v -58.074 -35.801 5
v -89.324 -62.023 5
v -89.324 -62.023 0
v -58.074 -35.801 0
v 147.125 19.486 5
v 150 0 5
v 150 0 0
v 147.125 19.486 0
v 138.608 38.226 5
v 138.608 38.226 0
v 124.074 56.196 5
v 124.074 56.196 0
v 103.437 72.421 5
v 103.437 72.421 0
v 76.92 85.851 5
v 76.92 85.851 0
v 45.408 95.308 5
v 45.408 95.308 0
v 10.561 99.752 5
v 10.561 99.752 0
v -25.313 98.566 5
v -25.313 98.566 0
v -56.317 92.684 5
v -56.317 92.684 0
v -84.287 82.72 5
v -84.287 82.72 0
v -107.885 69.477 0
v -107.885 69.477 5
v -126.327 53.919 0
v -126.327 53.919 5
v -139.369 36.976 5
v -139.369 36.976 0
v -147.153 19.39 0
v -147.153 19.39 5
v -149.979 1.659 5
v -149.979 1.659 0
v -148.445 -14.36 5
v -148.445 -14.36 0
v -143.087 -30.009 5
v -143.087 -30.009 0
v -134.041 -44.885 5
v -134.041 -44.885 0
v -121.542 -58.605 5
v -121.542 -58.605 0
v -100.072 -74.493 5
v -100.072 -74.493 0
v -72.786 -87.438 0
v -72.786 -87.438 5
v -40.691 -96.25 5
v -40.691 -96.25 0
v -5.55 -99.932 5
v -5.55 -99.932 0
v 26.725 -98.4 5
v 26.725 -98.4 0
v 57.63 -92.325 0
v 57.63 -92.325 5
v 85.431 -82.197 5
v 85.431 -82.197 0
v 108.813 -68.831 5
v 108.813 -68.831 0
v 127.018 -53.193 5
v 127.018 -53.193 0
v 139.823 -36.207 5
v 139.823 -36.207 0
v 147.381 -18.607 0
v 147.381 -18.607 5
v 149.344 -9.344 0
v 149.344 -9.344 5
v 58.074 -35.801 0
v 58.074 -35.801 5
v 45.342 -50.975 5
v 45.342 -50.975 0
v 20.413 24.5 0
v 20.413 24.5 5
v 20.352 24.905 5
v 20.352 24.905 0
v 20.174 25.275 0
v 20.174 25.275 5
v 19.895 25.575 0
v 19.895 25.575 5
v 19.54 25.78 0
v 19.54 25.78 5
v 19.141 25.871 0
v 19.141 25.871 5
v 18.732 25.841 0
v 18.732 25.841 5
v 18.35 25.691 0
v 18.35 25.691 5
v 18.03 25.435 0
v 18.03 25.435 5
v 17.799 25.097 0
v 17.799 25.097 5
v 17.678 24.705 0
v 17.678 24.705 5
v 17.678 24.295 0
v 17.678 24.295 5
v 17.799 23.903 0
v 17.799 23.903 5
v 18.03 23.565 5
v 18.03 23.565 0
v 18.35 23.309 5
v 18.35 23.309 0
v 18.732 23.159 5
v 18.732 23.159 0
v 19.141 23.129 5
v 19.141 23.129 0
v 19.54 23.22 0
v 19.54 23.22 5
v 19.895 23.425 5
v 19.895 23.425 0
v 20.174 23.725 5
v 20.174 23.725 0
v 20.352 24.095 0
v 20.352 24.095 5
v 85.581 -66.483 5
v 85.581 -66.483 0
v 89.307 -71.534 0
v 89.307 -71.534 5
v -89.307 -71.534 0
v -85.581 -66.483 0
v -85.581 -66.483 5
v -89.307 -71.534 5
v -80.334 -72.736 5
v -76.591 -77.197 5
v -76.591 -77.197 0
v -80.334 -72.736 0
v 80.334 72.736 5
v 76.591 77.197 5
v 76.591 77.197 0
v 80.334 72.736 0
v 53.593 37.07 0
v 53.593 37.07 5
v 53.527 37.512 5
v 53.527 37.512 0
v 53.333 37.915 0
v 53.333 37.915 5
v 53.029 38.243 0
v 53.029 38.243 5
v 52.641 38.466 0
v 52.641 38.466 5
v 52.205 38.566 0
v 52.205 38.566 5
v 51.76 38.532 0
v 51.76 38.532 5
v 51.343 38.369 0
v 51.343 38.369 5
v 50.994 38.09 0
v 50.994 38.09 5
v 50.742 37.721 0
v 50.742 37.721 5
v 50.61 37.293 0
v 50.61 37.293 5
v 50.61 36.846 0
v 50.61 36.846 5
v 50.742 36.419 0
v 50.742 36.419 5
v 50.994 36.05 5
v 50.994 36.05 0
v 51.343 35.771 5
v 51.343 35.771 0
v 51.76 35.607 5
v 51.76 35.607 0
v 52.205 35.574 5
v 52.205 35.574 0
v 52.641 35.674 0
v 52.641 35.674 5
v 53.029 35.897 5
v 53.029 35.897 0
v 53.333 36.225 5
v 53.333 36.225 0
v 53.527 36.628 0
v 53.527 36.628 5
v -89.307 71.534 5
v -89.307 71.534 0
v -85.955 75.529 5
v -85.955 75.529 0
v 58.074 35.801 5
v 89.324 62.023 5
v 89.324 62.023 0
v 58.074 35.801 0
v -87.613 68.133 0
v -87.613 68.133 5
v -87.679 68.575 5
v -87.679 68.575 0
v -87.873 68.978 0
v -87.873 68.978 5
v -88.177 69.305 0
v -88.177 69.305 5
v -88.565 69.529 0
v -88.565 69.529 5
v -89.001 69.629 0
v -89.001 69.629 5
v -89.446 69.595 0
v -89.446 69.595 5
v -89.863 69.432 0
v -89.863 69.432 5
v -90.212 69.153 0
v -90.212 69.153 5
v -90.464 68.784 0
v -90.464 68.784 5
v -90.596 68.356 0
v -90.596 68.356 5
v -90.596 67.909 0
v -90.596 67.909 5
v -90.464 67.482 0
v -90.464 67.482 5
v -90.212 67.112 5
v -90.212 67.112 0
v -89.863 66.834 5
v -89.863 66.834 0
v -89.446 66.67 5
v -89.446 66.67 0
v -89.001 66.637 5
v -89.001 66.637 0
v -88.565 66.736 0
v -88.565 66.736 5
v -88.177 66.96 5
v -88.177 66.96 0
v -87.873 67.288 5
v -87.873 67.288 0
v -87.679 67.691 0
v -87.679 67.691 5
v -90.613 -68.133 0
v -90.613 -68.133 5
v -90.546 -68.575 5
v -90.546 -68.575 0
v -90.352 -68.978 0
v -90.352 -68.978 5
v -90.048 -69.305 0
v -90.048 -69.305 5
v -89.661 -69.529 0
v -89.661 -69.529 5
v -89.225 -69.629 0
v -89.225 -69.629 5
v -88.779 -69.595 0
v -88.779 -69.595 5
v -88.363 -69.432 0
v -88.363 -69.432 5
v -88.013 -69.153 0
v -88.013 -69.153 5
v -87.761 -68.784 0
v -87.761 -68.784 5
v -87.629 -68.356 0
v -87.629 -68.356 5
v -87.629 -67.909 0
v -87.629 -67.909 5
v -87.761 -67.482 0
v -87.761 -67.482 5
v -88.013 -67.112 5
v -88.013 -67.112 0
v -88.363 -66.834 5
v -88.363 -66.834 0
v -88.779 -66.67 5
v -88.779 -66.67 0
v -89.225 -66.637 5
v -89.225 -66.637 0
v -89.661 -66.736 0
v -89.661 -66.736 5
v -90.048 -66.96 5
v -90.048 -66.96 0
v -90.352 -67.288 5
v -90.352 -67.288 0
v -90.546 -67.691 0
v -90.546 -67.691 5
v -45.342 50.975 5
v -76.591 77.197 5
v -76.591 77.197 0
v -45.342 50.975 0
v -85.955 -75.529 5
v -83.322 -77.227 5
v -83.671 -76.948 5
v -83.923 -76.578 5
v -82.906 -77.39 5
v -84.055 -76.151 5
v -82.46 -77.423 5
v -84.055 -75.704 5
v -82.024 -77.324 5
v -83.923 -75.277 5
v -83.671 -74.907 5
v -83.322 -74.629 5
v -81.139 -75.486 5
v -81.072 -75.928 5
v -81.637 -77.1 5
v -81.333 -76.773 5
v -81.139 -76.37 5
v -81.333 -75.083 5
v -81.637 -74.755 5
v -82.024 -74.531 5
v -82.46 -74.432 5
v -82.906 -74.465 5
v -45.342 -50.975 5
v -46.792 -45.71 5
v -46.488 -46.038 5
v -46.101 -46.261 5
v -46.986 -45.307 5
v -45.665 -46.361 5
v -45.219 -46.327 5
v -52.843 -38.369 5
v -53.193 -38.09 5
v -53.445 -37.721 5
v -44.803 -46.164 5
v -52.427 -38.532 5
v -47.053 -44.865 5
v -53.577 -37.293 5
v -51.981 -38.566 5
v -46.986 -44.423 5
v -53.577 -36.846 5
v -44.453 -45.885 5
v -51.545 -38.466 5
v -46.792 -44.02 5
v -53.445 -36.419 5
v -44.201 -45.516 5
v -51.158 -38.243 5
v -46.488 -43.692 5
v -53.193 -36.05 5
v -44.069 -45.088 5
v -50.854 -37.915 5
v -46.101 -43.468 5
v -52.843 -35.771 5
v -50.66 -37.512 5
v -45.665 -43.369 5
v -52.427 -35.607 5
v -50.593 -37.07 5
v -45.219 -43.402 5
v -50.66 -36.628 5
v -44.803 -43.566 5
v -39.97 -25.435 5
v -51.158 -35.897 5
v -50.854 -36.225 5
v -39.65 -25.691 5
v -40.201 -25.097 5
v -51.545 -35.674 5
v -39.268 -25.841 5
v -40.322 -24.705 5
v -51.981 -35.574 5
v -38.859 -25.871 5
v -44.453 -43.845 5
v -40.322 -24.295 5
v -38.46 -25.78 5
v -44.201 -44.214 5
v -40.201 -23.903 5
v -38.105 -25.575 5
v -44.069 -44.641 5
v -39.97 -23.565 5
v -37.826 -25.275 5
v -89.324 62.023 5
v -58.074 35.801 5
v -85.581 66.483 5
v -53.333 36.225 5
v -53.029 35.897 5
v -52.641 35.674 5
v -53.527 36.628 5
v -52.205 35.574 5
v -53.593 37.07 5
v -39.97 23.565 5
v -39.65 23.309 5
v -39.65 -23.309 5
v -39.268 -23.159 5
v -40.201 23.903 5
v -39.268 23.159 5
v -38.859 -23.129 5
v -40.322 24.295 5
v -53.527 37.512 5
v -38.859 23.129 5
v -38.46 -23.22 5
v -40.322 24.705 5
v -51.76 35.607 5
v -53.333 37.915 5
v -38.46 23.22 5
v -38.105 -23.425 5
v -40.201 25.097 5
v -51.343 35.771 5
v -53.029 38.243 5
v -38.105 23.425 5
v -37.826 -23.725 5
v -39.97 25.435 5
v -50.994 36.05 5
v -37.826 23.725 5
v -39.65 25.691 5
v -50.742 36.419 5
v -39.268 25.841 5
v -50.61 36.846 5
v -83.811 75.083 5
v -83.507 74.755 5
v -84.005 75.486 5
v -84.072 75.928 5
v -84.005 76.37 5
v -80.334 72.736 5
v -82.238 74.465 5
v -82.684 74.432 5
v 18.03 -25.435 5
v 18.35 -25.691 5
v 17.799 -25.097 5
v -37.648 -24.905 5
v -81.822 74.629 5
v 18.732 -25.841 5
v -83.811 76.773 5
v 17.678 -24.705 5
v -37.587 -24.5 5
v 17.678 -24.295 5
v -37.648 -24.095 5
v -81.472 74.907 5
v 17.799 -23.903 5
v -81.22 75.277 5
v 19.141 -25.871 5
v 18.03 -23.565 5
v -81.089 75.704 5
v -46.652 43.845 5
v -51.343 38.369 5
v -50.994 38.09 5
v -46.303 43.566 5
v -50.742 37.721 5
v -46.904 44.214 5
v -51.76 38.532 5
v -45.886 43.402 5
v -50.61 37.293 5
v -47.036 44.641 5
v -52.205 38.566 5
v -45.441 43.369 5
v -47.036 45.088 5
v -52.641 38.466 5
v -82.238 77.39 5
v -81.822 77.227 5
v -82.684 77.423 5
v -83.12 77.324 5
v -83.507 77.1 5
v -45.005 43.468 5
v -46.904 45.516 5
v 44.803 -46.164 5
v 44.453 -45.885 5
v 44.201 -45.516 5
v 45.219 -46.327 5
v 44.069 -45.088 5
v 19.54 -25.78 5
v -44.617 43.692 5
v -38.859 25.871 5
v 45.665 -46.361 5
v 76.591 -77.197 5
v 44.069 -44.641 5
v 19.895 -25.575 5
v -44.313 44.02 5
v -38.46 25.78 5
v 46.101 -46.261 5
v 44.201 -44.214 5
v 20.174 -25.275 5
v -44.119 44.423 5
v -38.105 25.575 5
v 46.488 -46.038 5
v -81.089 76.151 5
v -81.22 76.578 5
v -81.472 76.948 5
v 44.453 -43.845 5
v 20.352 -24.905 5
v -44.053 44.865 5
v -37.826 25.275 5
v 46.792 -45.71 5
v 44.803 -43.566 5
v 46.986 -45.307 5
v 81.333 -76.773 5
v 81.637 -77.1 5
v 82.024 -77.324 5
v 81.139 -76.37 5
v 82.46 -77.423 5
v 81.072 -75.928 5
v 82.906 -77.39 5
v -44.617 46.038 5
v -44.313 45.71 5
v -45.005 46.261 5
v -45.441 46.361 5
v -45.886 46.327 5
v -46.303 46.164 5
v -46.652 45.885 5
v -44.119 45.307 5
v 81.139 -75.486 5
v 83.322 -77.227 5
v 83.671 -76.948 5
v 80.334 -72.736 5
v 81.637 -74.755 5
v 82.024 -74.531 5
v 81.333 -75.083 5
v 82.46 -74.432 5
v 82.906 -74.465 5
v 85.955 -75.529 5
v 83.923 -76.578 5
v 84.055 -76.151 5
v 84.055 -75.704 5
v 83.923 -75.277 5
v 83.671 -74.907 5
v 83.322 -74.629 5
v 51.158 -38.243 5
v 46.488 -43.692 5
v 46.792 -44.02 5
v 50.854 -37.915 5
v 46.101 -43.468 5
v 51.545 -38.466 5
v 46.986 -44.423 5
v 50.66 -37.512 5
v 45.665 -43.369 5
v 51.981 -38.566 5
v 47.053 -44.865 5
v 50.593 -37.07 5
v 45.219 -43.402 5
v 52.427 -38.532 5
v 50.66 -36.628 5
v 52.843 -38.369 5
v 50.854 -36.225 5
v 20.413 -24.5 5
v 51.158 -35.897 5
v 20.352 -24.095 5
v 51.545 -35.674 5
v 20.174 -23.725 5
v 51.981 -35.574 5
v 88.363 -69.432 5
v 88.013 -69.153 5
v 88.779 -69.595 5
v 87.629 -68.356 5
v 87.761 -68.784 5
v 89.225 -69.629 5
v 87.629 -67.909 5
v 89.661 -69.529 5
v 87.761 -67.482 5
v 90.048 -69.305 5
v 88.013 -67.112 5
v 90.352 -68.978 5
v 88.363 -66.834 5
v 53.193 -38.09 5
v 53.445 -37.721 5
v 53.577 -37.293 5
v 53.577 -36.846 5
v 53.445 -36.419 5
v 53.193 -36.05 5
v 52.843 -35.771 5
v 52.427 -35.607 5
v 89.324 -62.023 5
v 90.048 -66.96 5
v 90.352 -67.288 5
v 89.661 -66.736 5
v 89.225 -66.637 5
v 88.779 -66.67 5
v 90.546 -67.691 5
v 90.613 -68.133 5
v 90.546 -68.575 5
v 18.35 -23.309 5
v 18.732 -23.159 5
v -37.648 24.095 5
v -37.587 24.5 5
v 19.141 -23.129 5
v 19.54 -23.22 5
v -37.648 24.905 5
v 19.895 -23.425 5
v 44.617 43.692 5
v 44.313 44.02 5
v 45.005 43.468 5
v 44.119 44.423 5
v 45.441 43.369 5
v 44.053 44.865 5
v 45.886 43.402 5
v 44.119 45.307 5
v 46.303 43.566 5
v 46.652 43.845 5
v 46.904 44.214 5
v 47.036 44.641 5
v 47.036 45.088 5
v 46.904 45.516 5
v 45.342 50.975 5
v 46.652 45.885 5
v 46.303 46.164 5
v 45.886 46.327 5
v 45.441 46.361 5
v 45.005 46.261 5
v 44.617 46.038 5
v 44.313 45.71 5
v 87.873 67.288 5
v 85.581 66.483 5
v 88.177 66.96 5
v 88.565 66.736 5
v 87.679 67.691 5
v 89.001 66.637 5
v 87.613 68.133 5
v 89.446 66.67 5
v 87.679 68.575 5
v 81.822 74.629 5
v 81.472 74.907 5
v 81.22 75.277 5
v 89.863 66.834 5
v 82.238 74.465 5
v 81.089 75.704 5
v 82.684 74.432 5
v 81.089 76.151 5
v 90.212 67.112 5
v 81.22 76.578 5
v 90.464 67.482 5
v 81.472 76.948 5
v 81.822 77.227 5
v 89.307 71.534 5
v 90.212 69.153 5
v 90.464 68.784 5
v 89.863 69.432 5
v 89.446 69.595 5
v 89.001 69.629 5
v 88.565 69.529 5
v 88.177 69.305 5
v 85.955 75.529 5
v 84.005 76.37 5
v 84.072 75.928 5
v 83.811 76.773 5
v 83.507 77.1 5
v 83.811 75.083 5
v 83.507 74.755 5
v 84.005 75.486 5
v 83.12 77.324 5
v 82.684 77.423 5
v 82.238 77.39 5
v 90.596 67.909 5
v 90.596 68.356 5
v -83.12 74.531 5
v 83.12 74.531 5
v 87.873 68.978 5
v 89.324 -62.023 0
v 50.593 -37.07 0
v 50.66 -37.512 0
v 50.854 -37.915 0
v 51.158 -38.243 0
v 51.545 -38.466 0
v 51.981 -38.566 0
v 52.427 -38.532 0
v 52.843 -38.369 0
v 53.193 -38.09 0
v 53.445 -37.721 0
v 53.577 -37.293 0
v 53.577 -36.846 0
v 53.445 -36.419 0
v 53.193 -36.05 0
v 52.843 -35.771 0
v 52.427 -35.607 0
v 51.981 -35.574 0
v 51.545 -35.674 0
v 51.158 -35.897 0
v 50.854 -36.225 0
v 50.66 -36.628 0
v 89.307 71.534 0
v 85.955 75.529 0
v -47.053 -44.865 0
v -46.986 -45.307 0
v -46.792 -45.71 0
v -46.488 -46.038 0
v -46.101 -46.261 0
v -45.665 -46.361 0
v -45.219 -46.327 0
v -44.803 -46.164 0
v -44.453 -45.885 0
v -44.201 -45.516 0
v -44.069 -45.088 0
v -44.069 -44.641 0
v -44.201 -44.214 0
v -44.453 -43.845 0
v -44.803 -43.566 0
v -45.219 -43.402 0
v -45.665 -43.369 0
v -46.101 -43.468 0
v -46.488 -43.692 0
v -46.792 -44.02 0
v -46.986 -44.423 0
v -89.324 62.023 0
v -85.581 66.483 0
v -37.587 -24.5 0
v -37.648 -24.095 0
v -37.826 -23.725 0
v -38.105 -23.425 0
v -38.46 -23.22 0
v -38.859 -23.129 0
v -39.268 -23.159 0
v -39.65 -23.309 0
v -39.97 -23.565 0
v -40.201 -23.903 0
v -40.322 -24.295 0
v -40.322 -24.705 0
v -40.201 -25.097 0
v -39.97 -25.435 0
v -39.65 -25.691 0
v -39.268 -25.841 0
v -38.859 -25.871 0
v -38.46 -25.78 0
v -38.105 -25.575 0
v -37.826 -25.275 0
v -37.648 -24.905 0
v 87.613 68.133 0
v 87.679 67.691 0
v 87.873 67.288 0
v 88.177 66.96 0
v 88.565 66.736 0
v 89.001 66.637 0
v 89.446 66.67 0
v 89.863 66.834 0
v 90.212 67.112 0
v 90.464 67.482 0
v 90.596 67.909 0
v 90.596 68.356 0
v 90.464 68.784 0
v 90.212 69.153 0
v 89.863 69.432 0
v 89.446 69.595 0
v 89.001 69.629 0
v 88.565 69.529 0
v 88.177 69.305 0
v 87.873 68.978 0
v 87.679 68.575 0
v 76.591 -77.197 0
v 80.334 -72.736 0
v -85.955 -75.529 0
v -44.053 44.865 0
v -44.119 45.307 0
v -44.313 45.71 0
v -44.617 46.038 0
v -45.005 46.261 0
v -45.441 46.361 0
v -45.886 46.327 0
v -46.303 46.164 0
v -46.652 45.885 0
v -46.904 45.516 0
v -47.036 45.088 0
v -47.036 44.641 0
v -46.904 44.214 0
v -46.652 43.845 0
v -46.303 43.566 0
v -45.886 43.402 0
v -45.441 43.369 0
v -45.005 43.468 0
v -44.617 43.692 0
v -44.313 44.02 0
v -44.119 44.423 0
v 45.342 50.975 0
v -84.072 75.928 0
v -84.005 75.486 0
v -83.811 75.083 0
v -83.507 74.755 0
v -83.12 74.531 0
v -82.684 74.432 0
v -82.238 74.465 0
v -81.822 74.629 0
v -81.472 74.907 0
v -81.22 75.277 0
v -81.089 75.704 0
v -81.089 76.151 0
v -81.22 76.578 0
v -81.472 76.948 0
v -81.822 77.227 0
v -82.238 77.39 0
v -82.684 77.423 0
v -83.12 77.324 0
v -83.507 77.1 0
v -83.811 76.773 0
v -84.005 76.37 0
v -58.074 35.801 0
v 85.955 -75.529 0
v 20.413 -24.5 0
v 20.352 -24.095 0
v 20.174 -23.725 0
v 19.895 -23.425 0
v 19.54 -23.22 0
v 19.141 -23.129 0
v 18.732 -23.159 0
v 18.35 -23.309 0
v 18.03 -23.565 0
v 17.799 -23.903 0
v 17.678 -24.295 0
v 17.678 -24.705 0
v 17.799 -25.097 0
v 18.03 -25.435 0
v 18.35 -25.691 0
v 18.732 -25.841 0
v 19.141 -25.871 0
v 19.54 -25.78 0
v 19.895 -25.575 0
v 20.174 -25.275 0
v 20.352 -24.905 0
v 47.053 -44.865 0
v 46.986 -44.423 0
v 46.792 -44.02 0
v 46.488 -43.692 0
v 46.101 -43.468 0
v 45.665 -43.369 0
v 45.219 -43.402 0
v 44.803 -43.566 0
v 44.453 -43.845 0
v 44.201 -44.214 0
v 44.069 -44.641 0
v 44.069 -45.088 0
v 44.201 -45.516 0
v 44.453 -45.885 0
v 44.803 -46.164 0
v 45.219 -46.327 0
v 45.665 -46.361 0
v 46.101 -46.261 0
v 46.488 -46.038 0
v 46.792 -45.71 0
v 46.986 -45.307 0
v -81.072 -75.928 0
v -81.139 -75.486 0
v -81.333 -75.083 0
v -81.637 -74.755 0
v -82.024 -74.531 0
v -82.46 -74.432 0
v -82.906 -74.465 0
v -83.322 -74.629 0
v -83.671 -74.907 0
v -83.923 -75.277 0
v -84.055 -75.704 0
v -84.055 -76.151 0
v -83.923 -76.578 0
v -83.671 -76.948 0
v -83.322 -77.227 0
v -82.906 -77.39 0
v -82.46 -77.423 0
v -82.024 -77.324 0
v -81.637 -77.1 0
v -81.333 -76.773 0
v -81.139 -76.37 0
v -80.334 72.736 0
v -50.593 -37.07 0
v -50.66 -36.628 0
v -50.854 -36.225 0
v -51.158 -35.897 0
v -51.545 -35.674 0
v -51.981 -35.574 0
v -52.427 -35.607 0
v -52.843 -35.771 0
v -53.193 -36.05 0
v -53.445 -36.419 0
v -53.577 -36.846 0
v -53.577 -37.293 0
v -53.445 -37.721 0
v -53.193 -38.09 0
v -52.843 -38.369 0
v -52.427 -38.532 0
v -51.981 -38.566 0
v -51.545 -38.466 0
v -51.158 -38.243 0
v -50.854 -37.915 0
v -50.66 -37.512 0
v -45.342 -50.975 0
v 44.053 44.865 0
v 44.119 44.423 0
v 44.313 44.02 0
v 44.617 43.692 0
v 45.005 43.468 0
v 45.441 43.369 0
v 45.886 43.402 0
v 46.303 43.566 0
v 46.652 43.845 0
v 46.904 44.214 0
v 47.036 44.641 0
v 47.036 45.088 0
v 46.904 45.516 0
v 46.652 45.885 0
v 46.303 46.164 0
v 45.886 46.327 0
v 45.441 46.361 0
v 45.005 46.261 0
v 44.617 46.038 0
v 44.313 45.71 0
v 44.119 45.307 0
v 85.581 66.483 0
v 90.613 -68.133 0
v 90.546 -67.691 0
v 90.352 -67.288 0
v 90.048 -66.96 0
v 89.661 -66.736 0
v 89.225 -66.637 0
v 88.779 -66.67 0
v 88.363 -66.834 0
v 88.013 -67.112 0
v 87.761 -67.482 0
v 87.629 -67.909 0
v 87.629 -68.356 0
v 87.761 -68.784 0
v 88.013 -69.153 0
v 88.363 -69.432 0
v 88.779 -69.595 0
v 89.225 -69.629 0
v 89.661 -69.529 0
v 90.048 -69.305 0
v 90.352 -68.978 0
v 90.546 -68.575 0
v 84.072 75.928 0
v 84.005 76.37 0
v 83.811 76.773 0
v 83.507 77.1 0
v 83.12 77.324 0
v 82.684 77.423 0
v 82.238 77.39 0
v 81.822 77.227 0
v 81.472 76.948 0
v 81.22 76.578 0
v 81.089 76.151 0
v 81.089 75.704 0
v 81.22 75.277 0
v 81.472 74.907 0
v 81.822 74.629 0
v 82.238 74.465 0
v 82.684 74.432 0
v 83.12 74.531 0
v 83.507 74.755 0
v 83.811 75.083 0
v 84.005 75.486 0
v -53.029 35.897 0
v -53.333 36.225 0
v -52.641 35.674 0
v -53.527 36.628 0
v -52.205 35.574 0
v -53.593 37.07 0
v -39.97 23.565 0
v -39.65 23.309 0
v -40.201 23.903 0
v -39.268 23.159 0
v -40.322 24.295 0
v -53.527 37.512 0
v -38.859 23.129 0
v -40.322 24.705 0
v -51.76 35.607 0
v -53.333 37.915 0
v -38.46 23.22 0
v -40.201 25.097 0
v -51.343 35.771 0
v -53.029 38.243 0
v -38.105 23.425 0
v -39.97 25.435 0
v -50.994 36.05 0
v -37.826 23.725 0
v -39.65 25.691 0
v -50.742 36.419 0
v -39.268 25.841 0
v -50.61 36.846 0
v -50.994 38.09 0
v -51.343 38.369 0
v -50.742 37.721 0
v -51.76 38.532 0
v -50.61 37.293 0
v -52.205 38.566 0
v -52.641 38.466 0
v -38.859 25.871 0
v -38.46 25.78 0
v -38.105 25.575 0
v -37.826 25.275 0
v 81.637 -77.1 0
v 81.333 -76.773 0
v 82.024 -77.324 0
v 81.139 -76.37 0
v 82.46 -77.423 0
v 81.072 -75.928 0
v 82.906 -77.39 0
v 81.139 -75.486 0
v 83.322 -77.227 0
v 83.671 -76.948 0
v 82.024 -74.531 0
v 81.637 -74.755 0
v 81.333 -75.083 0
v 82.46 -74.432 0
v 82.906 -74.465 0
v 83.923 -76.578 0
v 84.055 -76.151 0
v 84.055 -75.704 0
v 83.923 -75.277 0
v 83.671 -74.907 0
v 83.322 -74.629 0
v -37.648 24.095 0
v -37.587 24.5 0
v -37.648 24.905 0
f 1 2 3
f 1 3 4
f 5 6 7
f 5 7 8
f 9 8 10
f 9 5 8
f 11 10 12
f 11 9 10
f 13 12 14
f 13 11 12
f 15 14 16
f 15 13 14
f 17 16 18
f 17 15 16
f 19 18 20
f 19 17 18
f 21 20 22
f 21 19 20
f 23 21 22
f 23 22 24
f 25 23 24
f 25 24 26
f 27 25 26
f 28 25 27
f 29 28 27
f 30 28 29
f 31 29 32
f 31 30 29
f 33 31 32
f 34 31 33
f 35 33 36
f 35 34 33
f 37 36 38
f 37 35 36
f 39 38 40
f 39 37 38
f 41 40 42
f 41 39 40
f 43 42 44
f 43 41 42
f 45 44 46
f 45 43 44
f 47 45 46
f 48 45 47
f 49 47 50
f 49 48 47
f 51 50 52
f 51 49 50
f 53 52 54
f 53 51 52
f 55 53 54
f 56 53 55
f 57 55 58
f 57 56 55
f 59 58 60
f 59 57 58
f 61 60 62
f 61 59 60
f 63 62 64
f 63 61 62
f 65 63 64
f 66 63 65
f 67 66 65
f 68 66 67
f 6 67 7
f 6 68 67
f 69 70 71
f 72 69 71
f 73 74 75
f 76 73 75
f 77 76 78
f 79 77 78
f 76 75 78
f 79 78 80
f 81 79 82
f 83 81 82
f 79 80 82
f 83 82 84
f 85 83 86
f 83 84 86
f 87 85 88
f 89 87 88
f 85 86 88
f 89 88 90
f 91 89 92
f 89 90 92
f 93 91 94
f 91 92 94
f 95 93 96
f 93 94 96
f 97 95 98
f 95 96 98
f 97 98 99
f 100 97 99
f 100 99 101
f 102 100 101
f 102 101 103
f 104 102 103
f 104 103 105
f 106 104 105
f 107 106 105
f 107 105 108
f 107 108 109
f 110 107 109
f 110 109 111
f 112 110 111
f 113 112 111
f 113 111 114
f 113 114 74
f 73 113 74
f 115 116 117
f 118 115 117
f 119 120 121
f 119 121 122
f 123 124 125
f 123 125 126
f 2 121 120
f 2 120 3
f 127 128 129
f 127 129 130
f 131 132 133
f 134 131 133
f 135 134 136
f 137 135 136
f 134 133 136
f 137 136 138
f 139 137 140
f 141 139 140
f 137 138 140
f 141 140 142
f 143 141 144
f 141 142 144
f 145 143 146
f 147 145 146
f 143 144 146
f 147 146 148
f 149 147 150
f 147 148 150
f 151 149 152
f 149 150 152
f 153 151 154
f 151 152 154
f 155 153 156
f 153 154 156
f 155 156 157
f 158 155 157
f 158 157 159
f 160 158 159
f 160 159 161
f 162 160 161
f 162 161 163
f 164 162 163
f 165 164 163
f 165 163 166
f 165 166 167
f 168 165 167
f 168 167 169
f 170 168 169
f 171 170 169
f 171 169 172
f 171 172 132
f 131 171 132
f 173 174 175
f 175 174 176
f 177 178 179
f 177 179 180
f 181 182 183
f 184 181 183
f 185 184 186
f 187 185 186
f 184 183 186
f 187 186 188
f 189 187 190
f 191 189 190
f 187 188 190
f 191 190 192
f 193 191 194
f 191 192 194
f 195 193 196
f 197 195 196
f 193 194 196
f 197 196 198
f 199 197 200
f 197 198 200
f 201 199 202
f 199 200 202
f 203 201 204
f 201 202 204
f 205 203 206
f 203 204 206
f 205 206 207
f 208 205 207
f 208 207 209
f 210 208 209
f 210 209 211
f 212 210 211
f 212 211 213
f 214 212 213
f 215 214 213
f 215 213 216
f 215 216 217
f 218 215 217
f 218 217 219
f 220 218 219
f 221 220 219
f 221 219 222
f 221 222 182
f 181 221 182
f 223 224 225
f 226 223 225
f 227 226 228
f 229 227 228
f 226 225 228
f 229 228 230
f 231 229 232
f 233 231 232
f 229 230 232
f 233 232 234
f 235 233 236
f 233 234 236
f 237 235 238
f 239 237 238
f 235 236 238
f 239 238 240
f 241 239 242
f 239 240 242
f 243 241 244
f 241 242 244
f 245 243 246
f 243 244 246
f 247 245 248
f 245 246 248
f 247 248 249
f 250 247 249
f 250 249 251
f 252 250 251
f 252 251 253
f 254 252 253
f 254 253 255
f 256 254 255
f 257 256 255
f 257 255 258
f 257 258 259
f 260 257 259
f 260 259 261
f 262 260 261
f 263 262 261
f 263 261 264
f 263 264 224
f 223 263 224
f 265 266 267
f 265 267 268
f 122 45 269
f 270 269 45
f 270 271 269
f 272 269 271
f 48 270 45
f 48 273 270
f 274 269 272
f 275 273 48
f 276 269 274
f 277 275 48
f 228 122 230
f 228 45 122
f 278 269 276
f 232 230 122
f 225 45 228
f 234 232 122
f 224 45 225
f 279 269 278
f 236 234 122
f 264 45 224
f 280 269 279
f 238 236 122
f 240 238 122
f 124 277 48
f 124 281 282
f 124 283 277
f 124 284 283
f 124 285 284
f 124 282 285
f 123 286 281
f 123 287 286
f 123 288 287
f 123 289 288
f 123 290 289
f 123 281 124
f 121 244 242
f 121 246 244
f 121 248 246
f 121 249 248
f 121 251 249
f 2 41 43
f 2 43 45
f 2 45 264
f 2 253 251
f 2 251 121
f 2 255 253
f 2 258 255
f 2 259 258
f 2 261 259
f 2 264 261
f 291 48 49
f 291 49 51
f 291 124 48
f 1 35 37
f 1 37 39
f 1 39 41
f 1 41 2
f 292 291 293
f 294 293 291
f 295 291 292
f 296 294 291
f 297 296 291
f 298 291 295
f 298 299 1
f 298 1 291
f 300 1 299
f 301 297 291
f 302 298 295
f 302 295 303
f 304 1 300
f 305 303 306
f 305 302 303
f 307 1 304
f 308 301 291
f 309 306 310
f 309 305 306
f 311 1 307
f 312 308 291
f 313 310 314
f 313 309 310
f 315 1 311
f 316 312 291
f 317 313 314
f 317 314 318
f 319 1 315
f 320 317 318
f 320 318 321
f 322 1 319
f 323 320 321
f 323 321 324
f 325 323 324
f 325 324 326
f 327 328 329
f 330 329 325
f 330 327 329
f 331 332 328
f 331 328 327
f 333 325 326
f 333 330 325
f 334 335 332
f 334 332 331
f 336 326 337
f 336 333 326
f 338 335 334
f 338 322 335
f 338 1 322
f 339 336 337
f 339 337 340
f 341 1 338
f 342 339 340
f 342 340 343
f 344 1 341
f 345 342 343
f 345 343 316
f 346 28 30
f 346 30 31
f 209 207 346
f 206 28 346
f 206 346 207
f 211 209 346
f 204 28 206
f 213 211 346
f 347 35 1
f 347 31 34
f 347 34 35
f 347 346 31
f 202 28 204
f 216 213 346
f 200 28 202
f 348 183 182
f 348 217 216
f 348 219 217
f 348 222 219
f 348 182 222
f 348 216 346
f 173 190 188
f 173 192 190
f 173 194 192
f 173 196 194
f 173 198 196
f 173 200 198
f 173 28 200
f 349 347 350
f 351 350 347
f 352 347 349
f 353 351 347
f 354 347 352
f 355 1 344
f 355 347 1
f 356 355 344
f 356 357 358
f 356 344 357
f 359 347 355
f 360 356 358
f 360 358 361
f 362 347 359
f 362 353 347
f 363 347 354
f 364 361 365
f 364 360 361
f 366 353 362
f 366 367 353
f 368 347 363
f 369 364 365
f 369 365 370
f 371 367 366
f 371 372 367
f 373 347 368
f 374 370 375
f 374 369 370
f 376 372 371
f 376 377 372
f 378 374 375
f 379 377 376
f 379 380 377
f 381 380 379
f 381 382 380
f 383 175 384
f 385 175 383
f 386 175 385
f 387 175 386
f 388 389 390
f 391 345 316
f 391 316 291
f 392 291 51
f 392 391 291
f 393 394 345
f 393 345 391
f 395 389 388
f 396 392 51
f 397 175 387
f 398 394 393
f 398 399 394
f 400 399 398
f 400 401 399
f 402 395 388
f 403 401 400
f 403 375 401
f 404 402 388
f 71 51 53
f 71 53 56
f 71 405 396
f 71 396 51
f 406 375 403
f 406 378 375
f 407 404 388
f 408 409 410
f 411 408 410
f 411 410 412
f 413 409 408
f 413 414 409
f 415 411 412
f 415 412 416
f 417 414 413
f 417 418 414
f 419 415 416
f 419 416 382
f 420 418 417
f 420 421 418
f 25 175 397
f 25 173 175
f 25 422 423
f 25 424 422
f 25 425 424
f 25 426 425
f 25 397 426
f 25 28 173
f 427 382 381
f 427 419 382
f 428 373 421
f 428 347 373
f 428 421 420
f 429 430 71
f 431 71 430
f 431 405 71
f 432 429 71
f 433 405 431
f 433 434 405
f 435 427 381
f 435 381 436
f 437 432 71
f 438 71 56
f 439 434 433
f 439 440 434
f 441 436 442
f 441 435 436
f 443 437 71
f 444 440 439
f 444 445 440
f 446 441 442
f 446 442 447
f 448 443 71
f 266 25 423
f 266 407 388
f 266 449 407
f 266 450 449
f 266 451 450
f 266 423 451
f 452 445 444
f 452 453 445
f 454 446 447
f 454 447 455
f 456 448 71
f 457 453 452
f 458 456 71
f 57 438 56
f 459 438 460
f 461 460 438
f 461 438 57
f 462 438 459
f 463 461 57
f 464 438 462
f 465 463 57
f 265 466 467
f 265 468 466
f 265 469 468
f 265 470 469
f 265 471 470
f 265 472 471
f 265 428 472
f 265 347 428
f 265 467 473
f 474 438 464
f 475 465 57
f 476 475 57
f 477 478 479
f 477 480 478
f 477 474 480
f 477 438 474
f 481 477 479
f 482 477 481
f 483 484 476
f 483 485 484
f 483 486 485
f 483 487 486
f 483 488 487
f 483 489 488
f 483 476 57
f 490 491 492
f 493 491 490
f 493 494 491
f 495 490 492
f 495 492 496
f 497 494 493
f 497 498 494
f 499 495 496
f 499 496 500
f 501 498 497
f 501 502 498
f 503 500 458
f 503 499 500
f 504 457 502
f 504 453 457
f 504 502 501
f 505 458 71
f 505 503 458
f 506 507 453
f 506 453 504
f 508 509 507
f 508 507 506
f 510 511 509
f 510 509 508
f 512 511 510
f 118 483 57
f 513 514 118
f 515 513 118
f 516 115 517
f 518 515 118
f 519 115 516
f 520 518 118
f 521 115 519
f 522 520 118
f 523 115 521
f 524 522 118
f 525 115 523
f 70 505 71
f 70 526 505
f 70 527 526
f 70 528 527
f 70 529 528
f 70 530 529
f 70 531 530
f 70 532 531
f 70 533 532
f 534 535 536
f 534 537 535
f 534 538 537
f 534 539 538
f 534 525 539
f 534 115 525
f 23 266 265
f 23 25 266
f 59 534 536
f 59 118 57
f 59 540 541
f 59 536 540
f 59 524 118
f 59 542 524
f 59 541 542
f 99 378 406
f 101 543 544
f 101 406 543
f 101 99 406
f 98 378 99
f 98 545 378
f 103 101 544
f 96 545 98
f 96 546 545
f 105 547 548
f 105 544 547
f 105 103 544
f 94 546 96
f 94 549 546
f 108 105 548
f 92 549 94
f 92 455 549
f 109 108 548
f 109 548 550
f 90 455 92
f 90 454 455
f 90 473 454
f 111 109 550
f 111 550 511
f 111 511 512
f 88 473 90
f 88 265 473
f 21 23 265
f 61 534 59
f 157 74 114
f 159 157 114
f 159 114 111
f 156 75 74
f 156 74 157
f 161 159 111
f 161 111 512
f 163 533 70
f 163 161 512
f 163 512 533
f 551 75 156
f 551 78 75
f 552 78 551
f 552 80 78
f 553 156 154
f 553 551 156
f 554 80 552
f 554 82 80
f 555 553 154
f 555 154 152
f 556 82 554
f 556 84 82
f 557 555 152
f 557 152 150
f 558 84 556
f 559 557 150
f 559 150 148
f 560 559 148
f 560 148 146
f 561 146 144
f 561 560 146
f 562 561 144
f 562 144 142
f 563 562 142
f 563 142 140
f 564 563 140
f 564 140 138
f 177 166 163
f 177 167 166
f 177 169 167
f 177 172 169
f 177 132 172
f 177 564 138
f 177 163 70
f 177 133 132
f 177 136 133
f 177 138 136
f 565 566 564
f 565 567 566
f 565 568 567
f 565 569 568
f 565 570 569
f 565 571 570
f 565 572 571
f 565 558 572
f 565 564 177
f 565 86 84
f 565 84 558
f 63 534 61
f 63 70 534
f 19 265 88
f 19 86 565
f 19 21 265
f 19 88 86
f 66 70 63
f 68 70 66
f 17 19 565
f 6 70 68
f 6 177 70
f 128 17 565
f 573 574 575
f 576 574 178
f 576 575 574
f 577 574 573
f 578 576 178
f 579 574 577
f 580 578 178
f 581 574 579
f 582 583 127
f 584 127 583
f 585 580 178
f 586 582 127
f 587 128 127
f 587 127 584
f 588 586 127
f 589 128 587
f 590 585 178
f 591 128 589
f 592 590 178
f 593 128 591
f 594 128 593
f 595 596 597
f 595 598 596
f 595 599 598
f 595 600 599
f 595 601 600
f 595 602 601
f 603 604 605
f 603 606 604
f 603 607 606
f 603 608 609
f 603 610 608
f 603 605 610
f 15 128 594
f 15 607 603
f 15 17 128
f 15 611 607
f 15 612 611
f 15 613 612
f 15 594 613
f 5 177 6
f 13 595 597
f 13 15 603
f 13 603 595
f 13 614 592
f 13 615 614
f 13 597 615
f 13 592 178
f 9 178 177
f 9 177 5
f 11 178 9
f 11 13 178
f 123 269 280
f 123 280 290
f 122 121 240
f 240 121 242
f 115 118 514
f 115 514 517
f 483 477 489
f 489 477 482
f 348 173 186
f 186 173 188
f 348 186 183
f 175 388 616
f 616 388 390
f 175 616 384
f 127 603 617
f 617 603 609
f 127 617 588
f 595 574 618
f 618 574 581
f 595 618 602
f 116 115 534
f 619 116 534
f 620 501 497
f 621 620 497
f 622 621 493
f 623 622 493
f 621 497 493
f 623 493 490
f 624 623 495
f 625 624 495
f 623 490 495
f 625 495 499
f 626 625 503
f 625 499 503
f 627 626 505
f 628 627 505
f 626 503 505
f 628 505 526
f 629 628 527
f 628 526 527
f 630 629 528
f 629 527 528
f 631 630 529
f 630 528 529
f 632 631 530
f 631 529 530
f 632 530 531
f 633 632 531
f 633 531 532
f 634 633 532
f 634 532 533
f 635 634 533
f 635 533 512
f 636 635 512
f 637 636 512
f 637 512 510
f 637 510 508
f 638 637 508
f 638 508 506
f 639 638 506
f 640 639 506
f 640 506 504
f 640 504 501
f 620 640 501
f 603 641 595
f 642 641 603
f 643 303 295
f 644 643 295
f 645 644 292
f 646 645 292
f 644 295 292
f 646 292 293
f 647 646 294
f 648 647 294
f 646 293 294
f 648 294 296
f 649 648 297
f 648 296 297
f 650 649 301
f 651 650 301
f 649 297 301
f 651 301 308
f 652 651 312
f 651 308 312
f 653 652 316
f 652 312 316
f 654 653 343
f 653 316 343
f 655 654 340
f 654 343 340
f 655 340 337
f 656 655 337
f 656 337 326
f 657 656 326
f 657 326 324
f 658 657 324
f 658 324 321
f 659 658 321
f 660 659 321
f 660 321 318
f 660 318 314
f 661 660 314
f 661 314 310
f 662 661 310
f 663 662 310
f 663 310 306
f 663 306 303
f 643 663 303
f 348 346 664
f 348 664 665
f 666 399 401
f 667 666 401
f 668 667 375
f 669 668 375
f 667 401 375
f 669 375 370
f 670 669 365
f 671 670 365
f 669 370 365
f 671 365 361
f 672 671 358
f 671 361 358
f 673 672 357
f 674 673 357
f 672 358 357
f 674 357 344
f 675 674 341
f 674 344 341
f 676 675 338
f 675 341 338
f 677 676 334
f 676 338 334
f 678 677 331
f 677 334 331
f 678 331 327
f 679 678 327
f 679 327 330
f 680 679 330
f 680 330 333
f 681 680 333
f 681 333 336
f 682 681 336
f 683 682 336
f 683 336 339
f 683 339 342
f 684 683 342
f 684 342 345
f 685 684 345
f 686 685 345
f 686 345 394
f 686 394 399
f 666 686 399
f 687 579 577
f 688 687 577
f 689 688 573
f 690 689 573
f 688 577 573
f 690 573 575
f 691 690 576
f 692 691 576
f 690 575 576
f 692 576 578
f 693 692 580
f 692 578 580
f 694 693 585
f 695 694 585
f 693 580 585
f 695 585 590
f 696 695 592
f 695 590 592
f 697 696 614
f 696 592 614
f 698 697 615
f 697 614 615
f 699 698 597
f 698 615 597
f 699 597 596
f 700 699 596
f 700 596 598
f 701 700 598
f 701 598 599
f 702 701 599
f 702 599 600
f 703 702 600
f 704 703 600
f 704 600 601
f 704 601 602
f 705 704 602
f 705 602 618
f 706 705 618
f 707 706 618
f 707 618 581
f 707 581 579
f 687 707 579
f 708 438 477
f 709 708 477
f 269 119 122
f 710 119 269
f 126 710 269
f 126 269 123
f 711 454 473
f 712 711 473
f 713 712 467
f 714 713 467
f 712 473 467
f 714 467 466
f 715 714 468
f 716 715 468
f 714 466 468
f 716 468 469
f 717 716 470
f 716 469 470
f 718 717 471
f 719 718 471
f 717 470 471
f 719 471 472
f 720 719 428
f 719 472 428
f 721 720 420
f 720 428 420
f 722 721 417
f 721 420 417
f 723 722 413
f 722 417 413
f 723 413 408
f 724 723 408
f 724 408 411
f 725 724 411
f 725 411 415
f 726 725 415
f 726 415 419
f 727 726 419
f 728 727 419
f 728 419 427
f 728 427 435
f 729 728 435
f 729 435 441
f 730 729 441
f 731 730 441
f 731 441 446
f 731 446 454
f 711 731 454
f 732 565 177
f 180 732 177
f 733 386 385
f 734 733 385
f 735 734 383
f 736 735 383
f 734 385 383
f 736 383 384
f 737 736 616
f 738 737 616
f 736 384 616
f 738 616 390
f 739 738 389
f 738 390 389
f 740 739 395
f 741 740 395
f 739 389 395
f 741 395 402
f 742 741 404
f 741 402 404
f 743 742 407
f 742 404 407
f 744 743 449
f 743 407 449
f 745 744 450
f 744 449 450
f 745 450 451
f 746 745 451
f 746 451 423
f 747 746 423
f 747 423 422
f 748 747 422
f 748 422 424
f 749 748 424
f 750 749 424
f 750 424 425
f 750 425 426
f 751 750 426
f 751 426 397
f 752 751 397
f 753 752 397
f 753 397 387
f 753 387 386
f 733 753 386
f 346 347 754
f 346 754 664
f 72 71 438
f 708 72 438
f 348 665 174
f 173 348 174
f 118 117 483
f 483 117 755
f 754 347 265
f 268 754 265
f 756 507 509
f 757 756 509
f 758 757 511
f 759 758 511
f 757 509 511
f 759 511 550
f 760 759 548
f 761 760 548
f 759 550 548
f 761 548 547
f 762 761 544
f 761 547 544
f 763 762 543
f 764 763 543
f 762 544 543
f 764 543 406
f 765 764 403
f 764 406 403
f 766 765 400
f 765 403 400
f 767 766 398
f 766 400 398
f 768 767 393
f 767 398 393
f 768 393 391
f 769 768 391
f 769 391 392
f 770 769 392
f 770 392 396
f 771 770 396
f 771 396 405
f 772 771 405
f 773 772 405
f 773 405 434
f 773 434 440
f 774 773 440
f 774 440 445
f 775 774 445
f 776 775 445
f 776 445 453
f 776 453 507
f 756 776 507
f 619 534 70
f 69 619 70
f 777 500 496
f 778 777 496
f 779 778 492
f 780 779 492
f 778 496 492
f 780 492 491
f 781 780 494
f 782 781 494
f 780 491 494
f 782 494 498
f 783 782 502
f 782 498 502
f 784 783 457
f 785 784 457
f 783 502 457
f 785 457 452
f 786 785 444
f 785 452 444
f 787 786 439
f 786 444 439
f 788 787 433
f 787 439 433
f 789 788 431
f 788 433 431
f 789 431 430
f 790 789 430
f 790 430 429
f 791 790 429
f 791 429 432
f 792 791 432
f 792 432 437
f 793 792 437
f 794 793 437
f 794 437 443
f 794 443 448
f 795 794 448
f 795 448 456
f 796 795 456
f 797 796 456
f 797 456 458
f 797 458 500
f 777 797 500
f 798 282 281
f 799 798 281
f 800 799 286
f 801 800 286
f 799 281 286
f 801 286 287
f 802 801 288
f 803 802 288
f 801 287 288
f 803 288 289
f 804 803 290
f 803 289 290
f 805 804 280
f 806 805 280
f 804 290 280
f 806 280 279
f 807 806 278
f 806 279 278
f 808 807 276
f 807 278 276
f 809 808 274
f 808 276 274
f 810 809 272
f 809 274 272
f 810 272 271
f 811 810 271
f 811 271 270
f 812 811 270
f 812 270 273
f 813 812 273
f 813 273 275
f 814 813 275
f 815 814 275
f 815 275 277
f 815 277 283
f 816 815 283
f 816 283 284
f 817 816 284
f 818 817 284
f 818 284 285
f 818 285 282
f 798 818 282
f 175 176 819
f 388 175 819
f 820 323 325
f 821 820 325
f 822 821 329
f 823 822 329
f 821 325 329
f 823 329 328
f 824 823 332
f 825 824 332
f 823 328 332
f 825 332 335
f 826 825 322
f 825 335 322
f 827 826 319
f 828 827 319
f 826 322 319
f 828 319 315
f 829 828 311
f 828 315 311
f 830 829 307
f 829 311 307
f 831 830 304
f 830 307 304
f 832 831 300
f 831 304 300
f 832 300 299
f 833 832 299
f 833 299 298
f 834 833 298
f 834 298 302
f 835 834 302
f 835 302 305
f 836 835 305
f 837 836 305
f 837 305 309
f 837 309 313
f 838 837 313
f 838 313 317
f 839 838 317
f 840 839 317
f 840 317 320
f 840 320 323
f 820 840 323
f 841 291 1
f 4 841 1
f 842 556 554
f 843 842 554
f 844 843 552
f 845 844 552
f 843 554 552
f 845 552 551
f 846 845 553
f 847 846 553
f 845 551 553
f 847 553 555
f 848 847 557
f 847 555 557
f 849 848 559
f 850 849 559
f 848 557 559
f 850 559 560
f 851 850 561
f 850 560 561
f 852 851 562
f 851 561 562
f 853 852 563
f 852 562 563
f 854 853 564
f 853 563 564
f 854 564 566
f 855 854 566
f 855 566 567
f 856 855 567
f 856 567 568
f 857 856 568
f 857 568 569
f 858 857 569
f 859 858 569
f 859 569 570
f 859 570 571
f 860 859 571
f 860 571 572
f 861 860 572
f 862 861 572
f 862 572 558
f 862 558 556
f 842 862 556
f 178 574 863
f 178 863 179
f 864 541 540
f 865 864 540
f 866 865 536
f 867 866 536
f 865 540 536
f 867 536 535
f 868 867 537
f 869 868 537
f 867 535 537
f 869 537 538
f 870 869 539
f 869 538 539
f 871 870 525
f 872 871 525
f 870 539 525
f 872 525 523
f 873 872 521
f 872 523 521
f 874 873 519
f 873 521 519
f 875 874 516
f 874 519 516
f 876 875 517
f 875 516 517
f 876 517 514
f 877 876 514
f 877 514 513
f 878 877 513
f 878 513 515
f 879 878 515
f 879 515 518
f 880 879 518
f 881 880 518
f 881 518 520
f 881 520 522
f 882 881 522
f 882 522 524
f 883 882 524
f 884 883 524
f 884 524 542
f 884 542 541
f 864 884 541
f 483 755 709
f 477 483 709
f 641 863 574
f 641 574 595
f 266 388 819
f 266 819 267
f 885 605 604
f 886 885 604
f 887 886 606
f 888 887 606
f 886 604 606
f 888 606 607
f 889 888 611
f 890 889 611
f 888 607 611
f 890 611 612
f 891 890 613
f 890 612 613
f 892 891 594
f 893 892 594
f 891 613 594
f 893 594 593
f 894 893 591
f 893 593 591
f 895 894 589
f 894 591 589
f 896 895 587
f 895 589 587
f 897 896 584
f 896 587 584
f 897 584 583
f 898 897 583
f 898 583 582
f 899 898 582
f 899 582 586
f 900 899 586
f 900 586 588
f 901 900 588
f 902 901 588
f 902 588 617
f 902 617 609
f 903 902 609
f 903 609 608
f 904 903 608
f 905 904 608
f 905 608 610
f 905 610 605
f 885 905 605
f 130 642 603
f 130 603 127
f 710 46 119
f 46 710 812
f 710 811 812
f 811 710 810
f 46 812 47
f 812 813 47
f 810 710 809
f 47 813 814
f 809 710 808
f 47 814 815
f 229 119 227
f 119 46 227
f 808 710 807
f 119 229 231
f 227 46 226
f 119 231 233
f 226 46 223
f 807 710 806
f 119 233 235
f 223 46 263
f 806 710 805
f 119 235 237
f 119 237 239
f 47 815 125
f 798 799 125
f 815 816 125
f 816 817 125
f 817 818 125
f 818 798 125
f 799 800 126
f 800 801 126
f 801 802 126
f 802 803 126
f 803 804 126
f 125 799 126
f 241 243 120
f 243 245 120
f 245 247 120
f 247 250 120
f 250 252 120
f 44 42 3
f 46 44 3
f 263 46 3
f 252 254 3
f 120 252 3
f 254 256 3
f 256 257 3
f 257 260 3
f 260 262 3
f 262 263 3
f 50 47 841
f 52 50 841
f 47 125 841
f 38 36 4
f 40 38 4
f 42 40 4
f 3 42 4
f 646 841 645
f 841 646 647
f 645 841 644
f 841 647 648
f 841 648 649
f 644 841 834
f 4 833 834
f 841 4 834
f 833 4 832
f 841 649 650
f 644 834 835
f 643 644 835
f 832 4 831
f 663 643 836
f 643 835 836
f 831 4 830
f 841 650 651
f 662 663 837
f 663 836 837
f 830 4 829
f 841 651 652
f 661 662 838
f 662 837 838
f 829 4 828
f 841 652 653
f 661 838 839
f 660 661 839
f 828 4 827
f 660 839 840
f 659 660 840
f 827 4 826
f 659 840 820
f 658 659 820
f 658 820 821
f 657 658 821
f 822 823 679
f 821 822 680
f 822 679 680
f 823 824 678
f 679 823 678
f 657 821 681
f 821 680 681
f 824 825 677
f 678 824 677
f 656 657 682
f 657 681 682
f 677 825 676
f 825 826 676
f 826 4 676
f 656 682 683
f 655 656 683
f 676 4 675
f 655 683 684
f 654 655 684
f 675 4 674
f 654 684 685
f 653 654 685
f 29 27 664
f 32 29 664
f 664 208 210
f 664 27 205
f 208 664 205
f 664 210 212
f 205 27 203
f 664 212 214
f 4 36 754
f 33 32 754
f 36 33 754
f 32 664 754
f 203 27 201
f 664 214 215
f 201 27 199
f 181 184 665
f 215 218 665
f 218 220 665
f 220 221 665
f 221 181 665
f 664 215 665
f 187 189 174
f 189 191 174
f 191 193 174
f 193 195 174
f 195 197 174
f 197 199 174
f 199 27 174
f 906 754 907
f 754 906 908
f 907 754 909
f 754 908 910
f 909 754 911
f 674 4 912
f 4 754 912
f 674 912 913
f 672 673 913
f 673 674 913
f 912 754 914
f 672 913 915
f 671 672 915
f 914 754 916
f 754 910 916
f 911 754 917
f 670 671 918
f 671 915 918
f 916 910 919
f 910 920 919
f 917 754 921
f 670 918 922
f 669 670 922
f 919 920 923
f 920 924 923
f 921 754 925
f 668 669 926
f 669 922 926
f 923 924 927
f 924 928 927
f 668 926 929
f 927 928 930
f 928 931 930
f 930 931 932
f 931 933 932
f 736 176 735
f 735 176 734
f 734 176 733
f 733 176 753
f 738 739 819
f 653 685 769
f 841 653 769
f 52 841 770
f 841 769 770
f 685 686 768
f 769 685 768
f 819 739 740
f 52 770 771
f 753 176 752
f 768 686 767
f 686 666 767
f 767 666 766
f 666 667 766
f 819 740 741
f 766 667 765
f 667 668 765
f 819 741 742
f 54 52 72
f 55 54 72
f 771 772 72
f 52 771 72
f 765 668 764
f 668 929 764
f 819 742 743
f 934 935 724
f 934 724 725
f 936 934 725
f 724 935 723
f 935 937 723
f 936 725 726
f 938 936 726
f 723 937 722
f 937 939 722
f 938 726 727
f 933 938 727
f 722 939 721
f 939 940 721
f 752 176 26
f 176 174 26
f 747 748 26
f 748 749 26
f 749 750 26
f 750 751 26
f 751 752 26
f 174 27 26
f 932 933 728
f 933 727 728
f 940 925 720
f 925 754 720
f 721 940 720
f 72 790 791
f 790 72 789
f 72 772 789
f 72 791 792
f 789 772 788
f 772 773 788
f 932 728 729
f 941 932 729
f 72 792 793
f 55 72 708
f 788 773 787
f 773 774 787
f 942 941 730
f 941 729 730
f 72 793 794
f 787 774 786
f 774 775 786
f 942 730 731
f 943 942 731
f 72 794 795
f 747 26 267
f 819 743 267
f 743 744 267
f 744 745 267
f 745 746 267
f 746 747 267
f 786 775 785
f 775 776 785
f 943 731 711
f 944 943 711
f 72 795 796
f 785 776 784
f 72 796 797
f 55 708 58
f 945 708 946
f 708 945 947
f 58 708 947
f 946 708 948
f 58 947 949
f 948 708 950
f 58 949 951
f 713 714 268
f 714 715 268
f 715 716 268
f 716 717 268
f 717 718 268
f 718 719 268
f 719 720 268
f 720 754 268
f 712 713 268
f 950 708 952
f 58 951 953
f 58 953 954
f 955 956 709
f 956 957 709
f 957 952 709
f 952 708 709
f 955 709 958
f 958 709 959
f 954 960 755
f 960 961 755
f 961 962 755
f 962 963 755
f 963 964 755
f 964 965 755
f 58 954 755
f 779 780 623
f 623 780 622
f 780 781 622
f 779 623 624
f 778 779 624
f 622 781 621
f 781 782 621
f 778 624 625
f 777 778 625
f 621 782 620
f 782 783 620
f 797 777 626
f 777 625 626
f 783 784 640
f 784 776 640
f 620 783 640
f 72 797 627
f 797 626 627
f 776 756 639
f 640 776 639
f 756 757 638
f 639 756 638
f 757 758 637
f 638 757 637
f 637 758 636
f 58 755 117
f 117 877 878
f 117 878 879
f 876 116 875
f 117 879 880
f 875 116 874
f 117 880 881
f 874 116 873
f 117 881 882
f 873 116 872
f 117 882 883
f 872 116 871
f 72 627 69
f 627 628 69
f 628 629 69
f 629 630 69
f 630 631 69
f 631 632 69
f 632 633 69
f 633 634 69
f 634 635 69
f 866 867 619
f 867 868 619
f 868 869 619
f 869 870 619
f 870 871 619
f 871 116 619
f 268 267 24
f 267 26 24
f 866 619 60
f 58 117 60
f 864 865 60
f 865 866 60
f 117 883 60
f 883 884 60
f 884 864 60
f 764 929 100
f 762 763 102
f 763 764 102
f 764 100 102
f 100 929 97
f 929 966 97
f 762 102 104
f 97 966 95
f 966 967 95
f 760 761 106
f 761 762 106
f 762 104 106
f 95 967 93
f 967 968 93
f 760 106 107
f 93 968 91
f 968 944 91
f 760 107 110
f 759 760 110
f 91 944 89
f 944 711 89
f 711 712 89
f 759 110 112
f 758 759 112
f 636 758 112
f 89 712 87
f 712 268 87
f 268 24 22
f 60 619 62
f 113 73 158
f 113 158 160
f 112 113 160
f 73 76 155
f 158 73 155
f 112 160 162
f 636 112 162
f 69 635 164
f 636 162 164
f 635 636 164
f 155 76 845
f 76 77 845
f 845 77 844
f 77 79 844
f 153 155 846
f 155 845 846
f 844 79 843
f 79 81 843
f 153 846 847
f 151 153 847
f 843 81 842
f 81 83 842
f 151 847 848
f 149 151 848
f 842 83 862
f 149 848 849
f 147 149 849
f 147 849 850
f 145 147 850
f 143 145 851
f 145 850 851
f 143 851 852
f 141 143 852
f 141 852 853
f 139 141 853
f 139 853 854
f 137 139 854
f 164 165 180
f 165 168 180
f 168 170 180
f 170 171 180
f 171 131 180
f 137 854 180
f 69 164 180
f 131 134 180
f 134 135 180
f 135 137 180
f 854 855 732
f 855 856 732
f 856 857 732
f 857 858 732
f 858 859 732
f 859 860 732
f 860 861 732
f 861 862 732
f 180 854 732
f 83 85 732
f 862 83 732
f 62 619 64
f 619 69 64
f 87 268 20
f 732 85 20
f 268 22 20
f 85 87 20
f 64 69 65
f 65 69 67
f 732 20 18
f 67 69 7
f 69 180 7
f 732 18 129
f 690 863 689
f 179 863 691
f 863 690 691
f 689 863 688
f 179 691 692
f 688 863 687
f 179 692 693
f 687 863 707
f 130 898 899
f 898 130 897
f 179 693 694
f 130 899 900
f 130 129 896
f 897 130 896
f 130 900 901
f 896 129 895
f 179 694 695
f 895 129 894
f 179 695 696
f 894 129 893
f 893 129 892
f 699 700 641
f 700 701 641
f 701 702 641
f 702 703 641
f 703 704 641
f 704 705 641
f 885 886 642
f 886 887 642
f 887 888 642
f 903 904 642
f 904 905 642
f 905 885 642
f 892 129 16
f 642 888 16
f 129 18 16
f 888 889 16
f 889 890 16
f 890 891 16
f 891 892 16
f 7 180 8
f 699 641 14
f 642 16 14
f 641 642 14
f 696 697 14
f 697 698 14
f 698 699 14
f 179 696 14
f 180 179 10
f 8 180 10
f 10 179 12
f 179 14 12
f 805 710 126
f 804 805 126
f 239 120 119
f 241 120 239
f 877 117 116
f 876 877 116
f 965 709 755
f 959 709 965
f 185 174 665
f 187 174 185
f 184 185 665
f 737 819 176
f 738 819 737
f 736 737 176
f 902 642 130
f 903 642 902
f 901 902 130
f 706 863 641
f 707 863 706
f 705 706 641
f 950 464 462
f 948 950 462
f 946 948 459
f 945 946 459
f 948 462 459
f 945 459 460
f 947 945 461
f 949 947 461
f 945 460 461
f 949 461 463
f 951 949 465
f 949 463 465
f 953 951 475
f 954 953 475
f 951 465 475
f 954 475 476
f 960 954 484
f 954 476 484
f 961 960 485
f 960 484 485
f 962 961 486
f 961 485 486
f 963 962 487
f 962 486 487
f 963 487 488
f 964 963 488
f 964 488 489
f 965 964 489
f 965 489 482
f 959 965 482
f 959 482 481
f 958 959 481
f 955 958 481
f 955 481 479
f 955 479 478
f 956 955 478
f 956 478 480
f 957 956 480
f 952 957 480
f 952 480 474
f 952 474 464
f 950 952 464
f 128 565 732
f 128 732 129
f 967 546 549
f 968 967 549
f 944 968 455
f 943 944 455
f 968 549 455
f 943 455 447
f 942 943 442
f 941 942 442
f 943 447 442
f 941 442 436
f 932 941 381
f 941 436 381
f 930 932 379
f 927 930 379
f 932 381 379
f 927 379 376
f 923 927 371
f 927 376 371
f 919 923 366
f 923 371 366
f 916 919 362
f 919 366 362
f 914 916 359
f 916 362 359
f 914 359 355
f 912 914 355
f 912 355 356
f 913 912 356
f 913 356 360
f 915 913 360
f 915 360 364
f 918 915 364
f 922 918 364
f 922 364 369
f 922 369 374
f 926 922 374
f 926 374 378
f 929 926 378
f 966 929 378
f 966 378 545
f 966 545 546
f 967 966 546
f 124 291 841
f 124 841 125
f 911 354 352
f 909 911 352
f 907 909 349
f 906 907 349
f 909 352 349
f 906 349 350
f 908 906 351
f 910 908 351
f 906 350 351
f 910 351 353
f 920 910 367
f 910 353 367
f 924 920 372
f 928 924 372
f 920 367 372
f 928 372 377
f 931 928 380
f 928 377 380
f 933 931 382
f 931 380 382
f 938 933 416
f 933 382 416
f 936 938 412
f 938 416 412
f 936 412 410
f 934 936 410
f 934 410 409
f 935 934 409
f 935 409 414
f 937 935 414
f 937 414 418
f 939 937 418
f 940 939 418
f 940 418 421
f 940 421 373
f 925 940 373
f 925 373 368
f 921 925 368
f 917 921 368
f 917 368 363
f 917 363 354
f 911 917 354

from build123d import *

# Parameters (mm, degrees)
SKETCH1_RX           = 150
SKETCH1_RY           = 100
BOSS_EXTRUDE1_DEPTH  = 5
CUT_EXTRUDE2_DEPTH   = 181.346887969
SKETCH19_R           = 1.5
CUT_EXTRUDE3_DEPTH   = 181.346887969
CUT_EXTRUDE4_DEPTH   = 181.346887969
MIRROR2_COPY_1_DEPTH = 181.346887969
SKETCH22_R           = 1.375
CUT_EXTRUDE5_DEPTH   = 181.346887969


with BuildPart() as part:
    # Sketch1 → Boss-Extrude1 (new body)
    with BuildSketch(Plane.XY.offset(5)):
        with Locations(Location((0, 0), (0, 0, 0))):
            Ellipse(SKETCH1_RX, SKETCH1_RY)
    extrude(amount=-BOSS_EXTRUDE1_DEPTH)

    # Sketch18 → Cut-Extrude2 (cut, through all)
    with BuildSketch(Plane.XY.offset(5)):
        Polygon((-89.323679082, -62.022736108), (-58.07385358, -35.801019055), (-51.707696778, -43.387909295), (-45.341539976, -50.974799535), (-76.591365477, -77.196516588), align=None)
        Polygon((-89.323679082, 62.022736108), (-76.591365477, 77.196516588), (-45.341539976, 50.974799535), (-51.707696778, 43.387909295), (-58.07385358, 35.801019055), align=None)
        Polygon((51.707696778, -43.387909295), (45.341539976, -50.974799535), (76.591365477, -77.196516588), (89.323679082, -62.022736108), (58.07385358, -35.801019055), align=None)
        Polygon((58.07385358, 35.801019055), (51.707696778, 43.387909295), (45.341539976, 50.974799535), (76.591365477, 77.196516588), (89.323679082, 62.022736108), align=None)
    extrude(amount=-CUT_EXTRUDE2_DEPTH, mode=Mode.SUBTRACT)

    # Sketch19 → Cut-Extrude3 (cut, through all)
    with BuildSketch(Plane.XY.offset(5)):
        with Locations((-52.093329986, -37.069886693)):
            Circle(SKETCH19_R)
        with Locations(Location((-45.552623639, -44.86479698, 0), (0, 0, 180))):
            Circle(SKETCH19_R)
        with Locations((-82.571889071, -75.927648951)):
            Circle(SKETCH19_R)
        with Locations(Location((-89.112595418, -68.132738663, 0), (0, 0, 180))):
            Circle(SKETCH19_R)
        with Locations((-89.112595418, 68.132738663)):
            Circle(SKETCH19_R)
        with Locations(Location((-82.571889071, 75.927648951, 0), (0, 0, 180))):
            Circle(SKETCH19_R)
        with Locations((-45.552623639, 44.86479698)):
            Circle(SKETCH19_R)
        with Locations(Location((-52.093329986, 37.069886693, 0), (0, 0, 180))):
            Circle(SKETCH19_R)
        with Locations((52.093329986, 37.069886693)):
            Circle(SKETCH19_R)
        with Locations(Location((45.552623639, 44.86479698, 0), (0, 0, 180))):
            Circle(SKETCH19_R)
        with Locations((82.571889071, 75.927648951)):
            Circle(SKETCH19_R)
        with Locations(Location((89.112595418, 68.132738663, 0), (0, 0, 180))):
            Circle(SKETCH19_R)
        with Locations((89.112595418, -68.132738663)):
            Circle(SKETCH19_R)
        with Locations(Location((82.571889071, -75.927648951, 0), (0, 0, 180))):
            Circle(SKETCH19_R)
        with Locations((45.552623639, -44.86479698)):
            Circle(SKETCH19_R)
        with Locations(Location((52.093329986, -37.069886693, 0), (0, 0, 180))):
            Circle(SKETCH19_R)
    extrude(amount=-CUT_EXTRUDE3_DEPTH, mode=Mode.SUBTRACT)

    # Sketch21 → Cut-Extrude4 (cut, through all)
    with BuildSketch(Plane(origin=(0, 0, 0), x_dir=(-1, 0, 0), z_dir=(0, 0, -1))):
        Polygon((85.580702241, -66.483442205), (89.307086593, -71.533729271), (85.954984028, -75.528609546), (80.334342318, -72.735810491), align=None)
    cut_extrude4 = extrude(amount=-CUT_EXTRUDE4_DEPTH, mode=Mode.SUBTRACT)

    # Mirror1: Cut-Extrude4 across plane
    add(cut_extrude4.mirror(Plane.ZX), mode=Mode.SUBTRACT)

    # Mirror2: Cut-Extrude4 across plane
    add(cut_extrude4.mirror(Plane(origin=(0, 0, 0), x_dir=(0, 0, 1), z_dir=(1, 0, 0))), mode=Mode.SUBTRACT)

    # Mirror2 copy 1 sketch → Mirror2 copy 1 (cut, through all)
    with BuildSketch(Plane(origin=(0, 0, 0), x_dir=(1, 0, 0), z_dir=(0, 0, -1))):
        Polygon((85.580702241, -66.483442205), (89.307086593, -71.533729271), (85.954984028, -75.528609546), (80.334342318, -72.735810491), align=None)
    extrude(amount=-MIRROR2_COPY_1_DEPTH, mode=Mode.SUBTRACT)

    # Sketch22 → Cut-Extrude5 (cut, through all)
    with BuildSketch(Plane.XY.offset(5)):
        with Locations((-38.962083673, -24.5)):
            Circle(SKETCH22_R)
        with Locations((19.037916327, -24.5)):
            Circle(SKETCH22_R)
        with Locations((19.037916327, 24.5)):
            Circle(SKETCH22_R)
        with Locations((-38.962083673, 24.5)):
            Circle(SKETCH22_R)
    extrude(amount=-CUT_EXTRUDE5_DEPTH, mode=Mode.SUBTRACT)


solid = part.part
